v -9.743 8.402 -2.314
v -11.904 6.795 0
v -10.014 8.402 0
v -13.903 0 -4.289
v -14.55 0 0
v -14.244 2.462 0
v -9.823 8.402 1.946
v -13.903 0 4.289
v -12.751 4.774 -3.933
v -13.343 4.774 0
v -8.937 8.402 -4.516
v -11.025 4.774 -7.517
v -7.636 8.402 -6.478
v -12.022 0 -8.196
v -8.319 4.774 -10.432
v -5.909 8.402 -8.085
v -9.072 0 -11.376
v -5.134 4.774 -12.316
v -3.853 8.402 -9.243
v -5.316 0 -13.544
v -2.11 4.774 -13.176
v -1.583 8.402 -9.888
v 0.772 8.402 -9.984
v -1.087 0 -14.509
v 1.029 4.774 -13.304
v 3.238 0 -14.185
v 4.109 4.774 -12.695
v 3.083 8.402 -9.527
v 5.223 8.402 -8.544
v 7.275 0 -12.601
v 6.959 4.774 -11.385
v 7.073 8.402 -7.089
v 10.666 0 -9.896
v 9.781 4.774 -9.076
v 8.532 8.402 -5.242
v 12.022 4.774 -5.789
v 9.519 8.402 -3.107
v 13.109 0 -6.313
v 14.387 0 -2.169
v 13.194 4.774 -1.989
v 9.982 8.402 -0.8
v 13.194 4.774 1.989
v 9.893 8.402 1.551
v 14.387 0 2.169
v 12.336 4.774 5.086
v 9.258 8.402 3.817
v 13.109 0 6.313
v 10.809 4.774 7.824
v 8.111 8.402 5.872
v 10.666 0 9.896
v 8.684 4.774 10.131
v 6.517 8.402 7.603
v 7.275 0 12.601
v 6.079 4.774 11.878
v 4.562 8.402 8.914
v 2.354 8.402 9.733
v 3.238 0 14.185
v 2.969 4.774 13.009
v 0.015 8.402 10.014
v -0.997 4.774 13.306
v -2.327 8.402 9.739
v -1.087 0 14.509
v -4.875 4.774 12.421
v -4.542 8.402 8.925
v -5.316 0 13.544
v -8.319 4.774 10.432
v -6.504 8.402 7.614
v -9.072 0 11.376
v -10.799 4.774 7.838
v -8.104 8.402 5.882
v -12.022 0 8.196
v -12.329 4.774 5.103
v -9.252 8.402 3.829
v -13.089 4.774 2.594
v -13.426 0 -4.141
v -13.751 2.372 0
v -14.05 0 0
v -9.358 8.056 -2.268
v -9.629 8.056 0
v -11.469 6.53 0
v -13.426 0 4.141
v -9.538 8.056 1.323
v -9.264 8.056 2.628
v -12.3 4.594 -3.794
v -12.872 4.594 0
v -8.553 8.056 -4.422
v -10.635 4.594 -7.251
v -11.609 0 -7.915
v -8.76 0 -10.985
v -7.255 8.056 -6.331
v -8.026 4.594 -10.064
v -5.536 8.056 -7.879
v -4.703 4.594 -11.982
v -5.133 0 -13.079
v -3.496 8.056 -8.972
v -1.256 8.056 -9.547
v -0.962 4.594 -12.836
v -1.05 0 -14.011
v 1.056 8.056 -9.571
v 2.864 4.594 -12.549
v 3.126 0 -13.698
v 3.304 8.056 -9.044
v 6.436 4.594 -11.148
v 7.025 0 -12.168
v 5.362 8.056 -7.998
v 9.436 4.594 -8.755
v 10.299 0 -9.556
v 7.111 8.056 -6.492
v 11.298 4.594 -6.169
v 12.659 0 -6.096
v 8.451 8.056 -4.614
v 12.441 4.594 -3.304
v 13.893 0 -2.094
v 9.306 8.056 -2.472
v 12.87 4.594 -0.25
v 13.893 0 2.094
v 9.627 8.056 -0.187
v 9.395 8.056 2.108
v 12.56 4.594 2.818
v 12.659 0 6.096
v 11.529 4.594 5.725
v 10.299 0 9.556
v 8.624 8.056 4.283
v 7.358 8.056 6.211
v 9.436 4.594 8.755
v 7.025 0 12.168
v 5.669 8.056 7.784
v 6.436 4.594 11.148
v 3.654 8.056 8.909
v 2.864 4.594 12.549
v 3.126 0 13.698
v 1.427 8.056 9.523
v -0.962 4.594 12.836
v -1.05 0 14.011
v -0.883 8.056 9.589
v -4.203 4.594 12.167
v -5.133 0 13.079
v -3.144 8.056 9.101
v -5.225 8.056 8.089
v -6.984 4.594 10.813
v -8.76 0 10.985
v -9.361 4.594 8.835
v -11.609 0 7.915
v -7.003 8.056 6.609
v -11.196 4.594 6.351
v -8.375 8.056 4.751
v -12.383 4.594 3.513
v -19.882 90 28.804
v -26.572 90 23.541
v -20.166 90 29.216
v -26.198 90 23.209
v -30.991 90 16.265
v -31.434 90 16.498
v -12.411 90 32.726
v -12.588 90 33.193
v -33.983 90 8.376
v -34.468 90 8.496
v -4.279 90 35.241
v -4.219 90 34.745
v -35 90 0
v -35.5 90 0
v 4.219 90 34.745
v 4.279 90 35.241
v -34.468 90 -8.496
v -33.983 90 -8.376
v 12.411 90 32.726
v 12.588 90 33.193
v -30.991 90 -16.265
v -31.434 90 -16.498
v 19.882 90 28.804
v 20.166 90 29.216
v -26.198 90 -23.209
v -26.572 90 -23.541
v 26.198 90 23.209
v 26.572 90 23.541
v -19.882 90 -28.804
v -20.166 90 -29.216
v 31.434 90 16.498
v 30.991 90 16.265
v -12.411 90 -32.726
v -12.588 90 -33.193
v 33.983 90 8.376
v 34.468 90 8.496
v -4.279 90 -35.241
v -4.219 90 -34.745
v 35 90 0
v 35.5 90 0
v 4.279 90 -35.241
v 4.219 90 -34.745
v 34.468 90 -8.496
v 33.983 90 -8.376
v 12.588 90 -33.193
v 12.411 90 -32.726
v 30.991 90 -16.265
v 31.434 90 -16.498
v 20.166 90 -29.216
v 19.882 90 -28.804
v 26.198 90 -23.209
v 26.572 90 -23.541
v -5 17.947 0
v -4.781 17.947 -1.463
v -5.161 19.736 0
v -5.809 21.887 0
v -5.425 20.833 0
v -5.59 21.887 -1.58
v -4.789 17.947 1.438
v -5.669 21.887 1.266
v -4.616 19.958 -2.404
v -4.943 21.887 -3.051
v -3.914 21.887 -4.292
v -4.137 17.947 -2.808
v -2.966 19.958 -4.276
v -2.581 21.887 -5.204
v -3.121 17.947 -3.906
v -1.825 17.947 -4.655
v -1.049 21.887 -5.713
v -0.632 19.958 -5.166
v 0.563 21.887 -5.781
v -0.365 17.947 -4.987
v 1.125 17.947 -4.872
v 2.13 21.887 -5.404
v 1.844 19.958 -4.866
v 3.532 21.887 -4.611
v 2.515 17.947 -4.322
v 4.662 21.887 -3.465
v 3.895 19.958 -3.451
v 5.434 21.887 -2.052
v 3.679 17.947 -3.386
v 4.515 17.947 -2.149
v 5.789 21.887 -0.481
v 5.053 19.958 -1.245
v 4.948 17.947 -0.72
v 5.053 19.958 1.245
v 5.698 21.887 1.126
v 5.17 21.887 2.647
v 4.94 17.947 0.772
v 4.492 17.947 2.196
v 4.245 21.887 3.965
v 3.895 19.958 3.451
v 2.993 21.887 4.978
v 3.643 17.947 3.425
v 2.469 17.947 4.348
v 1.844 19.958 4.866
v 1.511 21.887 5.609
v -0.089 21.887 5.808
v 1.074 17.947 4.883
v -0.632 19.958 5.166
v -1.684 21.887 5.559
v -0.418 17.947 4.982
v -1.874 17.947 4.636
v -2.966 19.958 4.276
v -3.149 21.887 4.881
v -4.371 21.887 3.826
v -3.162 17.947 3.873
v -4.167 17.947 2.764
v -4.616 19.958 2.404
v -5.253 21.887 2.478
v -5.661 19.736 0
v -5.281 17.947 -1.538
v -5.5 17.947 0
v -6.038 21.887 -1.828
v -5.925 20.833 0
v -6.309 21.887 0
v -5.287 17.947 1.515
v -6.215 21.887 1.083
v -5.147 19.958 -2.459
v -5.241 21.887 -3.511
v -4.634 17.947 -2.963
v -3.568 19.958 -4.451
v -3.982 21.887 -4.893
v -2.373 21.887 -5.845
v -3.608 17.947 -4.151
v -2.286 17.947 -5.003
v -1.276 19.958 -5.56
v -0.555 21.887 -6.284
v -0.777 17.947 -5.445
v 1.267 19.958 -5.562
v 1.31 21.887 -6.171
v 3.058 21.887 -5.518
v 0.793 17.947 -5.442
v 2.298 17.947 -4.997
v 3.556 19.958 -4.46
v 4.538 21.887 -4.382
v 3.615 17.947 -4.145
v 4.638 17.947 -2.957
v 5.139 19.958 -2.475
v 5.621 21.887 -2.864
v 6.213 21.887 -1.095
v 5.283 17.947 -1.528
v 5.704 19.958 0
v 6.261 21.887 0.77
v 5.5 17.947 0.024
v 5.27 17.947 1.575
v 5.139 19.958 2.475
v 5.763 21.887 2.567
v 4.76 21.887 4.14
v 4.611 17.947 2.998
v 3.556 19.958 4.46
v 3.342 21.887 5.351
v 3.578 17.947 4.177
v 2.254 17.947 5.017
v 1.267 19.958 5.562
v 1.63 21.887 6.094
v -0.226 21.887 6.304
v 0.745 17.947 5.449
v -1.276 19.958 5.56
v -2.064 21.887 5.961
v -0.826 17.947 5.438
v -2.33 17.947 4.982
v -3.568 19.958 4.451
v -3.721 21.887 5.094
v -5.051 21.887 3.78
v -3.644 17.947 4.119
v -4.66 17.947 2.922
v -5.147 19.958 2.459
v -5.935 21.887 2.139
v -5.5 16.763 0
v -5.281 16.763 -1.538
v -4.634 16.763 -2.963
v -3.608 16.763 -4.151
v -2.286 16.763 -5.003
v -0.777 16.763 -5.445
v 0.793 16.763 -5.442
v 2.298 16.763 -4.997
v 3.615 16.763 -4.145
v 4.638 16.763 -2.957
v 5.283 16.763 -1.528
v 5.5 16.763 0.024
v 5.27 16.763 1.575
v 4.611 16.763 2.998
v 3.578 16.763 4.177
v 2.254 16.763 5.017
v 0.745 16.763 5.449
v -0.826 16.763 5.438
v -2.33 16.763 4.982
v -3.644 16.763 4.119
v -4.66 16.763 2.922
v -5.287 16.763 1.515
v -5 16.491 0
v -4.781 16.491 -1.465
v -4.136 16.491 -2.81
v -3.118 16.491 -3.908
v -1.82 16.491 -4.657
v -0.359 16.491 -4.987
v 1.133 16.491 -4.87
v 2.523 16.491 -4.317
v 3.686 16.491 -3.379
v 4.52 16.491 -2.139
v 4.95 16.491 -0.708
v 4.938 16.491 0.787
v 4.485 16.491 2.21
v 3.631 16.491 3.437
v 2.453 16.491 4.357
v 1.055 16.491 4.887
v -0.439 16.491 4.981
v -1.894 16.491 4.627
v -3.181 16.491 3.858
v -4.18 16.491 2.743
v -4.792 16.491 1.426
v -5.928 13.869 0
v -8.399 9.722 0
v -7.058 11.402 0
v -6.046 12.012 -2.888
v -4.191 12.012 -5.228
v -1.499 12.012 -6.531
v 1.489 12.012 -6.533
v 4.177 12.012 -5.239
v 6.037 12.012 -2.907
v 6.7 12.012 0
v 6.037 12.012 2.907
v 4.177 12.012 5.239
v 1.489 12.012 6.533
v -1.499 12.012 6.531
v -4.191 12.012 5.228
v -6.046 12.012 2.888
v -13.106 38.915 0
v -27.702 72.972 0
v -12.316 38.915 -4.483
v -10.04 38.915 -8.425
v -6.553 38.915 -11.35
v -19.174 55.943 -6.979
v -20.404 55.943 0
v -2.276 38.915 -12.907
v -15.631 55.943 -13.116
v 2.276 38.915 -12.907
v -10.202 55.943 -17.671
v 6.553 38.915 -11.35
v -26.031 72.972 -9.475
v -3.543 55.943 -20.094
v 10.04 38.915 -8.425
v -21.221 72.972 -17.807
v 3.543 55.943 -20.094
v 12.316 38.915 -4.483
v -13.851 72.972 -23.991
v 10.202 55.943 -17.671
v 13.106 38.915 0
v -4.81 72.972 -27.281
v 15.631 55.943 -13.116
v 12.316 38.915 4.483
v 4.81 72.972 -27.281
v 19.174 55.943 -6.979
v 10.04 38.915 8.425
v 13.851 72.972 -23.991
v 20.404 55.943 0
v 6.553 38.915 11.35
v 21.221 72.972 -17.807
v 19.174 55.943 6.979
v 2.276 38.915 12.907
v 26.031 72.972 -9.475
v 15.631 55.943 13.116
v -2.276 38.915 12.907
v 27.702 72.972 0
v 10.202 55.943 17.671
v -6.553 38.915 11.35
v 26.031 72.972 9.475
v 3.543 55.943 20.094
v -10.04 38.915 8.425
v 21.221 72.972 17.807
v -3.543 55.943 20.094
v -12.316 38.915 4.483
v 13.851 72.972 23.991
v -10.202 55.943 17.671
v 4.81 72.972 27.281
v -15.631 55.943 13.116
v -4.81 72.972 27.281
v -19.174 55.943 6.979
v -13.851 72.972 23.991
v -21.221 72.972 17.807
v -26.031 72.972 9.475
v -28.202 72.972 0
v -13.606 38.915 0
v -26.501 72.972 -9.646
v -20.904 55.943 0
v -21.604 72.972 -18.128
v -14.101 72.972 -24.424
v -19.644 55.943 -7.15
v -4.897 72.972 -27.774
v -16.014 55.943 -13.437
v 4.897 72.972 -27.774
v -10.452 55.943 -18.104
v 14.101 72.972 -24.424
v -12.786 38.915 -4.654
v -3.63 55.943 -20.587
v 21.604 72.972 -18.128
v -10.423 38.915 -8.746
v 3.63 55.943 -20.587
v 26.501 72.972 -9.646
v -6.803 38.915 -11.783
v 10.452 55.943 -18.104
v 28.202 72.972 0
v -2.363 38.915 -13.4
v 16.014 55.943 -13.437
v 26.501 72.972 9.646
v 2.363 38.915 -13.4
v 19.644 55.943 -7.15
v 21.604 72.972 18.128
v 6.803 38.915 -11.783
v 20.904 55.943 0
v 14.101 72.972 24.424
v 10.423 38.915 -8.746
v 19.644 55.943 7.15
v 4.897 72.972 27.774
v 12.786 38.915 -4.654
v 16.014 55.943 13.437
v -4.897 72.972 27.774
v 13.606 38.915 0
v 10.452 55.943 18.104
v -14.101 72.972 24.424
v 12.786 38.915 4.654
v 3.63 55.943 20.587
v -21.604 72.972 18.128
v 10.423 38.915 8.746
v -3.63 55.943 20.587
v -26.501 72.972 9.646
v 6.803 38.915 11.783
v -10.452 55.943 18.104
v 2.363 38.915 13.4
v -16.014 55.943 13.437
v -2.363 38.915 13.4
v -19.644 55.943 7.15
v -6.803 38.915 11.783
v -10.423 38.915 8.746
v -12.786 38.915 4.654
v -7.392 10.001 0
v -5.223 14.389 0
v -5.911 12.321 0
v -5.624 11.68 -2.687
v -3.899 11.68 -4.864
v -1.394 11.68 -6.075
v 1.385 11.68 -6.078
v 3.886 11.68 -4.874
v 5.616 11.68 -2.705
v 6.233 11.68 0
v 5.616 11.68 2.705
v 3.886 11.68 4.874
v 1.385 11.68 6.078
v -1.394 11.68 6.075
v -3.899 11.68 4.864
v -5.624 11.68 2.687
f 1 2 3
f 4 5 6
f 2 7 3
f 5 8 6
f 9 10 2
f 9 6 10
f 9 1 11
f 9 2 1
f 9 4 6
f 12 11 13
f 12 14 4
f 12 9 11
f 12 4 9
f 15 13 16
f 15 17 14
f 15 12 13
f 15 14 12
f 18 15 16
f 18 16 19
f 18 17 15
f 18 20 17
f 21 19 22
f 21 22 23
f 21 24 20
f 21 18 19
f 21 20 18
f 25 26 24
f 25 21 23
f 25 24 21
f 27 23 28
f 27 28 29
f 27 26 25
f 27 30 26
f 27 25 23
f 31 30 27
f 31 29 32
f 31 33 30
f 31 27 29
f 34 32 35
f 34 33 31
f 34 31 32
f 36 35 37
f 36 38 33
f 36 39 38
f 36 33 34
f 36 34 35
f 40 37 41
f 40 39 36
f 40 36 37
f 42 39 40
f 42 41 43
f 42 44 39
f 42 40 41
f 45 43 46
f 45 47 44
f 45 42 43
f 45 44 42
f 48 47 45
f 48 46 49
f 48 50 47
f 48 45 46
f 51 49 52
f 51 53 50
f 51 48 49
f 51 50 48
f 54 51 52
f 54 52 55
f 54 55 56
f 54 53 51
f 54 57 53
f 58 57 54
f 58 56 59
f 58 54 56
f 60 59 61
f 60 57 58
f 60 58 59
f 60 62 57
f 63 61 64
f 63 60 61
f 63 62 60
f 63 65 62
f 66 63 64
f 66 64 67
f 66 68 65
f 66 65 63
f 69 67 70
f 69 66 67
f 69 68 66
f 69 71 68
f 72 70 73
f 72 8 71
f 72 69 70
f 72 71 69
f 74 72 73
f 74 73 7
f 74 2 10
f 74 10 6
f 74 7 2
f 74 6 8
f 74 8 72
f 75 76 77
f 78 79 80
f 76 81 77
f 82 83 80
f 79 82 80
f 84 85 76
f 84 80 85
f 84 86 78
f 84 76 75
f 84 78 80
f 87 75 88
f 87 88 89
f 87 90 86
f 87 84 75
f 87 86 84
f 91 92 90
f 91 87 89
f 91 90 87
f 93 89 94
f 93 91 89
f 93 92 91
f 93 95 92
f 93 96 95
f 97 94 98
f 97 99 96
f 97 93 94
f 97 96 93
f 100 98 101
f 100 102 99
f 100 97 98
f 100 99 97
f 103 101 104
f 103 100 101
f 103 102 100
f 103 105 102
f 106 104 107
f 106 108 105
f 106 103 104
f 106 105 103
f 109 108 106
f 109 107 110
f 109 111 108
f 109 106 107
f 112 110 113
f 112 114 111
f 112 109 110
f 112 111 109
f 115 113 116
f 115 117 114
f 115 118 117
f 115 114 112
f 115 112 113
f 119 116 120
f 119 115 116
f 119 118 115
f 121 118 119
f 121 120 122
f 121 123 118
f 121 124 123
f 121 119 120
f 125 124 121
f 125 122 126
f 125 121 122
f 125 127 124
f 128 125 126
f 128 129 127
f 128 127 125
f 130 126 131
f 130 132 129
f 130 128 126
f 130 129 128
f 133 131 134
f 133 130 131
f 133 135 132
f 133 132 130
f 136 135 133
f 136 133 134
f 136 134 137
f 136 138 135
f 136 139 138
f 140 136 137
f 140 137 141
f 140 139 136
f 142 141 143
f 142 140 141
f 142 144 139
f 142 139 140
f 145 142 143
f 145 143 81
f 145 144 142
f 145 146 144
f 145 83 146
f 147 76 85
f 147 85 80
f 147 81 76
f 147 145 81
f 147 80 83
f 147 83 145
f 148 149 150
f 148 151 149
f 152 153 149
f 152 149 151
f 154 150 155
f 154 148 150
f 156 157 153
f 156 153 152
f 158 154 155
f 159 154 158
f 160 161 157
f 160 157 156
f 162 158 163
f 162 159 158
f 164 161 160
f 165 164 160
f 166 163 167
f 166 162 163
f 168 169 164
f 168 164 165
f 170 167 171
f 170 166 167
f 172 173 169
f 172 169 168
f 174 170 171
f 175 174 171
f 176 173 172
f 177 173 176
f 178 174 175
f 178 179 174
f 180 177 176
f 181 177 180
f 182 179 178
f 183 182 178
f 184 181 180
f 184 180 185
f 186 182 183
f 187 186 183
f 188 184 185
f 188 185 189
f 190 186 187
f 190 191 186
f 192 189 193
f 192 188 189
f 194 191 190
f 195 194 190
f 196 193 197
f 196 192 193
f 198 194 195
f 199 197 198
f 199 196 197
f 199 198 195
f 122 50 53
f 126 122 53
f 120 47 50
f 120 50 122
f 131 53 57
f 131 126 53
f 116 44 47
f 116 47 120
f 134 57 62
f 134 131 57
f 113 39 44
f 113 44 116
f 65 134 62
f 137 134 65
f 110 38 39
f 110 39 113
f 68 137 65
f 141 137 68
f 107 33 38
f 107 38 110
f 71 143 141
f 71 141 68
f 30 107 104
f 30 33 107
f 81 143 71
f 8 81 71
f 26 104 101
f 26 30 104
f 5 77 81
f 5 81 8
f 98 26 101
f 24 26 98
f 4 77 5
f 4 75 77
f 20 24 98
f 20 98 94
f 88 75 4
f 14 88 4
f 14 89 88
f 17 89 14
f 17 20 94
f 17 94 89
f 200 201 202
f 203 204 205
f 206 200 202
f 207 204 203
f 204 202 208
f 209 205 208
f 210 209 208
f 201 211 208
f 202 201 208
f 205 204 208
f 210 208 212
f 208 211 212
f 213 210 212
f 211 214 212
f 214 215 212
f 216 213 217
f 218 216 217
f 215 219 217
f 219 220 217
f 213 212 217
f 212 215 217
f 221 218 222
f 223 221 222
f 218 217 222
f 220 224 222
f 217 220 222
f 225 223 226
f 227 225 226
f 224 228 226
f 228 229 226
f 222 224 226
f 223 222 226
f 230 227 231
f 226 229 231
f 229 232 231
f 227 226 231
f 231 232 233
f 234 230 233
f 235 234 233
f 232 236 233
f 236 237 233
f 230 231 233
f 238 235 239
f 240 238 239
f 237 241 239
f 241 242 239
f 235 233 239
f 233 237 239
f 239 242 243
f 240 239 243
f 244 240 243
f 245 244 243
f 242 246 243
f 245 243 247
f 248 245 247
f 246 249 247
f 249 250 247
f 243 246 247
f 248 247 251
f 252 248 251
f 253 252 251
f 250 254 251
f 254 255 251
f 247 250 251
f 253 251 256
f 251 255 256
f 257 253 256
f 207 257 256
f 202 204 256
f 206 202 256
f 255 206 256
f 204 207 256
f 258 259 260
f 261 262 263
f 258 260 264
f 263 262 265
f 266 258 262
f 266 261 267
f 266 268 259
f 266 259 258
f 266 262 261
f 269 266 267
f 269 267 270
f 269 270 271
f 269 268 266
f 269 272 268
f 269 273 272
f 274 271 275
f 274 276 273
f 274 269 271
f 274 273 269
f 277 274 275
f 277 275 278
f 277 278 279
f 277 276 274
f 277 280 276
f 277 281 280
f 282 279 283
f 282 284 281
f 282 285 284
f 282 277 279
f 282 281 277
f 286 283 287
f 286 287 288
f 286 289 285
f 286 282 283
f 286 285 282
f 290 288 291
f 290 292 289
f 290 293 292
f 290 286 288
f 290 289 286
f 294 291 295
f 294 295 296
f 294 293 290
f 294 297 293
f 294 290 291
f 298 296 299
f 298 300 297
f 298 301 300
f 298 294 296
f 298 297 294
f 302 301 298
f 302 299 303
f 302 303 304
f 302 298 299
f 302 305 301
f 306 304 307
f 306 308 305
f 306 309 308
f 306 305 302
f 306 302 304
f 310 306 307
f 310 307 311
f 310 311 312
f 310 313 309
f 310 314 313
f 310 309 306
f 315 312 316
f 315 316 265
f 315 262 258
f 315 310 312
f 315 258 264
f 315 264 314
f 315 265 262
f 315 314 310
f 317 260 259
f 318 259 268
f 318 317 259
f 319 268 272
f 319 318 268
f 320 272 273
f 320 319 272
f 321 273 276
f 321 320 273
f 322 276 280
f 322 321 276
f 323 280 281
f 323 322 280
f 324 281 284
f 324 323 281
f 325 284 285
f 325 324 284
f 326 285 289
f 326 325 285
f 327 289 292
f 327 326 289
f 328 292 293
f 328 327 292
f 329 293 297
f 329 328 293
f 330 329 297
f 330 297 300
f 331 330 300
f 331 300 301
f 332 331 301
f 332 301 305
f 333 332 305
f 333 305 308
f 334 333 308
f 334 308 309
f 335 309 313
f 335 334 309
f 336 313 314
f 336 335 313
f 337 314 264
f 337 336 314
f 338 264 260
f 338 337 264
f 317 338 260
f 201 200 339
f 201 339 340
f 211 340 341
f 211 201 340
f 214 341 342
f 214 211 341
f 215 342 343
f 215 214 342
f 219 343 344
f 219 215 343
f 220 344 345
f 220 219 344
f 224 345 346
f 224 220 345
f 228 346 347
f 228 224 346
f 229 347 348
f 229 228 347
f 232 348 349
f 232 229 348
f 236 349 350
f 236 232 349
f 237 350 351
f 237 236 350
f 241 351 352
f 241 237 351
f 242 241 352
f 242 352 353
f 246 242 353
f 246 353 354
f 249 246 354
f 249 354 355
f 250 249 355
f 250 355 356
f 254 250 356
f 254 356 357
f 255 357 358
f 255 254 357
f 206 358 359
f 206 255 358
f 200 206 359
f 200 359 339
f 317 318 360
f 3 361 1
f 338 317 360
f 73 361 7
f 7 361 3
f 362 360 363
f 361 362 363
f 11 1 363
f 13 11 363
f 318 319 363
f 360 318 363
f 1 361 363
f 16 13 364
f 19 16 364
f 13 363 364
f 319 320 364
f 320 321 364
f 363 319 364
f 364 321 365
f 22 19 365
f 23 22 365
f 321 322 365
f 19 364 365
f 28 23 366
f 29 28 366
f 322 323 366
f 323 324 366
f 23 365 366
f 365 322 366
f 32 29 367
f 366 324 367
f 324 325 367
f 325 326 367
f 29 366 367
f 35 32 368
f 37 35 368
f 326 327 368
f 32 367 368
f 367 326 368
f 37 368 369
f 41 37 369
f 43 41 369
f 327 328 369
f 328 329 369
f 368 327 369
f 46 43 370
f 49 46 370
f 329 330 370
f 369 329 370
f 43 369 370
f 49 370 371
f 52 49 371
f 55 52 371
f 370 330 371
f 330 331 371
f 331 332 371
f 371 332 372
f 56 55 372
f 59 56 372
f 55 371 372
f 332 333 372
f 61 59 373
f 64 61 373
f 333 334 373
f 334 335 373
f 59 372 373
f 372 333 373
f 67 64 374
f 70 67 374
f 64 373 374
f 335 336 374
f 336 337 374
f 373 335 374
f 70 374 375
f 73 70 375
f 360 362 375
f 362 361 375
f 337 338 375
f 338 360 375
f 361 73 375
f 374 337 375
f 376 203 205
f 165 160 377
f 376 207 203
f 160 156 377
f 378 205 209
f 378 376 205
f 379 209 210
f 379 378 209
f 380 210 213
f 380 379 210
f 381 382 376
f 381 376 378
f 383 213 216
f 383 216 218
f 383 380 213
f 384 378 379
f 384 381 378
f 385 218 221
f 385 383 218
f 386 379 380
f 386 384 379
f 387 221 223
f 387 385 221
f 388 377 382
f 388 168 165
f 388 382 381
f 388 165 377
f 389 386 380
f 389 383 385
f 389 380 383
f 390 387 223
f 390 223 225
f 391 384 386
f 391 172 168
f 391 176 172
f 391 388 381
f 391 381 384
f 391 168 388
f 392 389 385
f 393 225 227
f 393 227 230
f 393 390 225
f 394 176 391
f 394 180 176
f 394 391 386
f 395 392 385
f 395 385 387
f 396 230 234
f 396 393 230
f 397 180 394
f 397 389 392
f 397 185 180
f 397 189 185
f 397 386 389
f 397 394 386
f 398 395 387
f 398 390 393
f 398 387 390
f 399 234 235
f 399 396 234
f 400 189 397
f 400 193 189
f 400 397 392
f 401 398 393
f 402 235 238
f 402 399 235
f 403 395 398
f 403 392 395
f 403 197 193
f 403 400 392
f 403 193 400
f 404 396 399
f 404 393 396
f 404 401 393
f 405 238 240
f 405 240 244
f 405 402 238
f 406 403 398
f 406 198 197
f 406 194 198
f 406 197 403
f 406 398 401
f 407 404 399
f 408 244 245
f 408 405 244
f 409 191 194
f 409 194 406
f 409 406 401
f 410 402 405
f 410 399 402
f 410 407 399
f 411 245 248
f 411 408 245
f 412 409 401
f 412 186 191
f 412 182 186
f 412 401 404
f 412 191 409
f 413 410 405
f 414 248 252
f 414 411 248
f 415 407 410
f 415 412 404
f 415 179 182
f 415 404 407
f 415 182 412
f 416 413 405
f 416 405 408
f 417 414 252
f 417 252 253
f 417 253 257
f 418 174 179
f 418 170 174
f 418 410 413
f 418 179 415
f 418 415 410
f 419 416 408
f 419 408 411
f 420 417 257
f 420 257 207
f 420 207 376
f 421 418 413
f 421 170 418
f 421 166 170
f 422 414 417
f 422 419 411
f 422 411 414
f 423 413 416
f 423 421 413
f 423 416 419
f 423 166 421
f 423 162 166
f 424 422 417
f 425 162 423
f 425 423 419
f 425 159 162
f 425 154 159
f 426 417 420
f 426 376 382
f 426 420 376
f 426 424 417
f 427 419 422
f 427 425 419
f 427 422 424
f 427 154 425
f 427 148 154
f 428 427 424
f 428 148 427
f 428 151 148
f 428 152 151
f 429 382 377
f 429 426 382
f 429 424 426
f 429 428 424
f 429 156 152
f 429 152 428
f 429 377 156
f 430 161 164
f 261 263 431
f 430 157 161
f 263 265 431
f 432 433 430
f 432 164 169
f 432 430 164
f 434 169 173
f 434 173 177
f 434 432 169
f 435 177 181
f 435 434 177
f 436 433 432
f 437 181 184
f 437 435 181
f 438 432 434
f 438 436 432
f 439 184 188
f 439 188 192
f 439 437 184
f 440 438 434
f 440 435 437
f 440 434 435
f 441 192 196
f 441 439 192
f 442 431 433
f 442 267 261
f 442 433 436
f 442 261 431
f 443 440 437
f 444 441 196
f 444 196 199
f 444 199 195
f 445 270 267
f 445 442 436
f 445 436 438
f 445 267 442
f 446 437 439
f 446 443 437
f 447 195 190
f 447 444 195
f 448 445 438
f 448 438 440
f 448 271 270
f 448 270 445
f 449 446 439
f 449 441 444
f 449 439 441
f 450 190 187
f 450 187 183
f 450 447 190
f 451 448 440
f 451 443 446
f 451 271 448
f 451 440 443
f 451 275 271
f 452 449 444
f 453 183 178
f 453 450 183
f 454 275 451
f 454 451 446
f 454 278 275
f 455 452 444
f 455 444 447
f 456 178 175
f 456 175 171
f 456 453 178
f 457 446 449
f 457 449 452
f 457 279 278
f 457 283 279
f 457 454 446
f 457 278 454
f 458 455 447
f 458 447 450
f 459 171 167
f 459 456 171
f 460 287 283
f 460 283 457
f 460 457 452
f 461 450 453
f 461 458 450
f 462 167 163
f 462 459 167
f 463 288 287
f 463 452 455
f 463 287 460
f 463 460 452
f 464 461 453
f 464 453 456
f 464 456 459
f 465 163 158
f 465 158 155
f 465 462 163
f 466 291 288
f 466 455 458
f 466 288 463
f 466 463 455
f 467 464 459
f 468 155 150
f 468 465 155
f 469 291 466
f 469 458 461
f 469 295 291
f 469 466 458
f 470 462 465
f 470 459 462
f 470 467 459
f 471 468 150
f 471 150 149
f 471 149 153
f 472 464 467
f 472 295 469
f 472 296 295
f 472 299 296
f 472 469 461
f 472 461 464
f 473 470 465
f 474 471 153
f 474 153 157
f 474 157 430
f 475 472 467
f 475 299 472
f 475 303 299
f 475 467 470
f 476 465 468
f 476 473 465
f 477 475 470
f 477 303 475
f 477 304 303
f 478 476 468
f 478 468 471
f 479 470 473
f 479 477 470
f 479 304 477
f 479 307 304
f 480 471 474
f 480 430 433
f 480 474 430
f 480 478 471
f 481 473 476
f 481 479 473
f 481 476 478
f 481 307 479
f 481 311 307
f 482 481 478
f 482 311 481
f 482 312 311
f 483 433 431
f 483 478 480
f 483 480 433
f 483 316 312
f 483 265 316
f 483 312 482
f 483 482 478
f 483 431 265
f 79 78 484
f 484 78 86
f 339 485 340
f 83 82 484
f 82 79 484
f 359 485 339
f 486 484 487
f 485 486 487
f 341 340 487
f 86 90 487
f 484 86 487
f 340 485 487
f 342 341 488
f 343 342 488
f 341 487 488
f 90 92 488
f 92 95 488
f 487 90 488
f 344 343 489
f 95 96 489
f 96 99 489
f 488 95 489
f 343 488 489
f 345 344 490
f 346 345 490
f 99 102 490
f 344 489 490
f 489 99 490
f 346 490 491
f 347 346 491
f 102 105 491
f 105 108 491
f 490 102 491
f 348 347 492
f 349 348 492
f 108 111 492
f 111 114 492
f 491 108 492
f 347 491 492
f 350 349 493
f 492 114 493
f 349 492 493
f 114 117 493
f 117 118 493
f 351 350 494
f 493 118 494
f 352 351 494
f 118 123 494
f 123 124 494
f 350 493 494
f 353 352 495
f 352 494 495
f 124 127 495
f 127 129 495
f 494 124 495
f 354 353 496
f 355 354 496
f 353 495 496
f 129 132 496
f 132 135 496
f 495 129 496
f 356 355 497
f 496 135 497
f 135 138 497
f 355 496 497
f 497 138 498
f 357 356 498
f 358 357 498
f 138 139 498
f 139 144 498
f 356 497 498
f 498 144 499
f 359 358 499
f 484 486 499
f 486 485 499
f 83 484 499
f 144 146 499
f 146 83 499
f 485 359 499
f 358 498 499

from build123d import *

# Parameters (mm, degrees)
F2_R = 10


with BuildPart() as f1:
    # F0 (on Top) → F1 (revolve)
    with BuildSketch(Plane.XY):
        with BuildLine():
            Line((-5.5, 20), (-5.5, 10))
            ThreePointArc((-5.5, 10), (-11.951506, 6.74352), (-14.549876, 0))
            Line((-14.549876, 0), (-14.049876, 0))
            ThreePointArc((-14.049876, 0), (-11.427303, 6.573629), (-5, 9.536777))
            Line((-5, 9.536777), (-5, 20))
            Line((-5, 20), (-35, 90))
            Line((-35, 90), (-35.5, 90))
            Line((-35.5, 90), (-5.5, 20))
        make_face()
    revolve(axis=Axis((0, 34.304306, 0), (0, -1, 0)))

    # F2
    f2_edges = [f1.edges().sort_by_distance(p)[0] for p in [
        (5.5, 10, 0),
        (5.5, 20, 0),
        (5, 9.536777, 0),
        (5, 20, 0),
    ]]
    fillet(f2_edges, radius=F2_R)


solid = f1.part
